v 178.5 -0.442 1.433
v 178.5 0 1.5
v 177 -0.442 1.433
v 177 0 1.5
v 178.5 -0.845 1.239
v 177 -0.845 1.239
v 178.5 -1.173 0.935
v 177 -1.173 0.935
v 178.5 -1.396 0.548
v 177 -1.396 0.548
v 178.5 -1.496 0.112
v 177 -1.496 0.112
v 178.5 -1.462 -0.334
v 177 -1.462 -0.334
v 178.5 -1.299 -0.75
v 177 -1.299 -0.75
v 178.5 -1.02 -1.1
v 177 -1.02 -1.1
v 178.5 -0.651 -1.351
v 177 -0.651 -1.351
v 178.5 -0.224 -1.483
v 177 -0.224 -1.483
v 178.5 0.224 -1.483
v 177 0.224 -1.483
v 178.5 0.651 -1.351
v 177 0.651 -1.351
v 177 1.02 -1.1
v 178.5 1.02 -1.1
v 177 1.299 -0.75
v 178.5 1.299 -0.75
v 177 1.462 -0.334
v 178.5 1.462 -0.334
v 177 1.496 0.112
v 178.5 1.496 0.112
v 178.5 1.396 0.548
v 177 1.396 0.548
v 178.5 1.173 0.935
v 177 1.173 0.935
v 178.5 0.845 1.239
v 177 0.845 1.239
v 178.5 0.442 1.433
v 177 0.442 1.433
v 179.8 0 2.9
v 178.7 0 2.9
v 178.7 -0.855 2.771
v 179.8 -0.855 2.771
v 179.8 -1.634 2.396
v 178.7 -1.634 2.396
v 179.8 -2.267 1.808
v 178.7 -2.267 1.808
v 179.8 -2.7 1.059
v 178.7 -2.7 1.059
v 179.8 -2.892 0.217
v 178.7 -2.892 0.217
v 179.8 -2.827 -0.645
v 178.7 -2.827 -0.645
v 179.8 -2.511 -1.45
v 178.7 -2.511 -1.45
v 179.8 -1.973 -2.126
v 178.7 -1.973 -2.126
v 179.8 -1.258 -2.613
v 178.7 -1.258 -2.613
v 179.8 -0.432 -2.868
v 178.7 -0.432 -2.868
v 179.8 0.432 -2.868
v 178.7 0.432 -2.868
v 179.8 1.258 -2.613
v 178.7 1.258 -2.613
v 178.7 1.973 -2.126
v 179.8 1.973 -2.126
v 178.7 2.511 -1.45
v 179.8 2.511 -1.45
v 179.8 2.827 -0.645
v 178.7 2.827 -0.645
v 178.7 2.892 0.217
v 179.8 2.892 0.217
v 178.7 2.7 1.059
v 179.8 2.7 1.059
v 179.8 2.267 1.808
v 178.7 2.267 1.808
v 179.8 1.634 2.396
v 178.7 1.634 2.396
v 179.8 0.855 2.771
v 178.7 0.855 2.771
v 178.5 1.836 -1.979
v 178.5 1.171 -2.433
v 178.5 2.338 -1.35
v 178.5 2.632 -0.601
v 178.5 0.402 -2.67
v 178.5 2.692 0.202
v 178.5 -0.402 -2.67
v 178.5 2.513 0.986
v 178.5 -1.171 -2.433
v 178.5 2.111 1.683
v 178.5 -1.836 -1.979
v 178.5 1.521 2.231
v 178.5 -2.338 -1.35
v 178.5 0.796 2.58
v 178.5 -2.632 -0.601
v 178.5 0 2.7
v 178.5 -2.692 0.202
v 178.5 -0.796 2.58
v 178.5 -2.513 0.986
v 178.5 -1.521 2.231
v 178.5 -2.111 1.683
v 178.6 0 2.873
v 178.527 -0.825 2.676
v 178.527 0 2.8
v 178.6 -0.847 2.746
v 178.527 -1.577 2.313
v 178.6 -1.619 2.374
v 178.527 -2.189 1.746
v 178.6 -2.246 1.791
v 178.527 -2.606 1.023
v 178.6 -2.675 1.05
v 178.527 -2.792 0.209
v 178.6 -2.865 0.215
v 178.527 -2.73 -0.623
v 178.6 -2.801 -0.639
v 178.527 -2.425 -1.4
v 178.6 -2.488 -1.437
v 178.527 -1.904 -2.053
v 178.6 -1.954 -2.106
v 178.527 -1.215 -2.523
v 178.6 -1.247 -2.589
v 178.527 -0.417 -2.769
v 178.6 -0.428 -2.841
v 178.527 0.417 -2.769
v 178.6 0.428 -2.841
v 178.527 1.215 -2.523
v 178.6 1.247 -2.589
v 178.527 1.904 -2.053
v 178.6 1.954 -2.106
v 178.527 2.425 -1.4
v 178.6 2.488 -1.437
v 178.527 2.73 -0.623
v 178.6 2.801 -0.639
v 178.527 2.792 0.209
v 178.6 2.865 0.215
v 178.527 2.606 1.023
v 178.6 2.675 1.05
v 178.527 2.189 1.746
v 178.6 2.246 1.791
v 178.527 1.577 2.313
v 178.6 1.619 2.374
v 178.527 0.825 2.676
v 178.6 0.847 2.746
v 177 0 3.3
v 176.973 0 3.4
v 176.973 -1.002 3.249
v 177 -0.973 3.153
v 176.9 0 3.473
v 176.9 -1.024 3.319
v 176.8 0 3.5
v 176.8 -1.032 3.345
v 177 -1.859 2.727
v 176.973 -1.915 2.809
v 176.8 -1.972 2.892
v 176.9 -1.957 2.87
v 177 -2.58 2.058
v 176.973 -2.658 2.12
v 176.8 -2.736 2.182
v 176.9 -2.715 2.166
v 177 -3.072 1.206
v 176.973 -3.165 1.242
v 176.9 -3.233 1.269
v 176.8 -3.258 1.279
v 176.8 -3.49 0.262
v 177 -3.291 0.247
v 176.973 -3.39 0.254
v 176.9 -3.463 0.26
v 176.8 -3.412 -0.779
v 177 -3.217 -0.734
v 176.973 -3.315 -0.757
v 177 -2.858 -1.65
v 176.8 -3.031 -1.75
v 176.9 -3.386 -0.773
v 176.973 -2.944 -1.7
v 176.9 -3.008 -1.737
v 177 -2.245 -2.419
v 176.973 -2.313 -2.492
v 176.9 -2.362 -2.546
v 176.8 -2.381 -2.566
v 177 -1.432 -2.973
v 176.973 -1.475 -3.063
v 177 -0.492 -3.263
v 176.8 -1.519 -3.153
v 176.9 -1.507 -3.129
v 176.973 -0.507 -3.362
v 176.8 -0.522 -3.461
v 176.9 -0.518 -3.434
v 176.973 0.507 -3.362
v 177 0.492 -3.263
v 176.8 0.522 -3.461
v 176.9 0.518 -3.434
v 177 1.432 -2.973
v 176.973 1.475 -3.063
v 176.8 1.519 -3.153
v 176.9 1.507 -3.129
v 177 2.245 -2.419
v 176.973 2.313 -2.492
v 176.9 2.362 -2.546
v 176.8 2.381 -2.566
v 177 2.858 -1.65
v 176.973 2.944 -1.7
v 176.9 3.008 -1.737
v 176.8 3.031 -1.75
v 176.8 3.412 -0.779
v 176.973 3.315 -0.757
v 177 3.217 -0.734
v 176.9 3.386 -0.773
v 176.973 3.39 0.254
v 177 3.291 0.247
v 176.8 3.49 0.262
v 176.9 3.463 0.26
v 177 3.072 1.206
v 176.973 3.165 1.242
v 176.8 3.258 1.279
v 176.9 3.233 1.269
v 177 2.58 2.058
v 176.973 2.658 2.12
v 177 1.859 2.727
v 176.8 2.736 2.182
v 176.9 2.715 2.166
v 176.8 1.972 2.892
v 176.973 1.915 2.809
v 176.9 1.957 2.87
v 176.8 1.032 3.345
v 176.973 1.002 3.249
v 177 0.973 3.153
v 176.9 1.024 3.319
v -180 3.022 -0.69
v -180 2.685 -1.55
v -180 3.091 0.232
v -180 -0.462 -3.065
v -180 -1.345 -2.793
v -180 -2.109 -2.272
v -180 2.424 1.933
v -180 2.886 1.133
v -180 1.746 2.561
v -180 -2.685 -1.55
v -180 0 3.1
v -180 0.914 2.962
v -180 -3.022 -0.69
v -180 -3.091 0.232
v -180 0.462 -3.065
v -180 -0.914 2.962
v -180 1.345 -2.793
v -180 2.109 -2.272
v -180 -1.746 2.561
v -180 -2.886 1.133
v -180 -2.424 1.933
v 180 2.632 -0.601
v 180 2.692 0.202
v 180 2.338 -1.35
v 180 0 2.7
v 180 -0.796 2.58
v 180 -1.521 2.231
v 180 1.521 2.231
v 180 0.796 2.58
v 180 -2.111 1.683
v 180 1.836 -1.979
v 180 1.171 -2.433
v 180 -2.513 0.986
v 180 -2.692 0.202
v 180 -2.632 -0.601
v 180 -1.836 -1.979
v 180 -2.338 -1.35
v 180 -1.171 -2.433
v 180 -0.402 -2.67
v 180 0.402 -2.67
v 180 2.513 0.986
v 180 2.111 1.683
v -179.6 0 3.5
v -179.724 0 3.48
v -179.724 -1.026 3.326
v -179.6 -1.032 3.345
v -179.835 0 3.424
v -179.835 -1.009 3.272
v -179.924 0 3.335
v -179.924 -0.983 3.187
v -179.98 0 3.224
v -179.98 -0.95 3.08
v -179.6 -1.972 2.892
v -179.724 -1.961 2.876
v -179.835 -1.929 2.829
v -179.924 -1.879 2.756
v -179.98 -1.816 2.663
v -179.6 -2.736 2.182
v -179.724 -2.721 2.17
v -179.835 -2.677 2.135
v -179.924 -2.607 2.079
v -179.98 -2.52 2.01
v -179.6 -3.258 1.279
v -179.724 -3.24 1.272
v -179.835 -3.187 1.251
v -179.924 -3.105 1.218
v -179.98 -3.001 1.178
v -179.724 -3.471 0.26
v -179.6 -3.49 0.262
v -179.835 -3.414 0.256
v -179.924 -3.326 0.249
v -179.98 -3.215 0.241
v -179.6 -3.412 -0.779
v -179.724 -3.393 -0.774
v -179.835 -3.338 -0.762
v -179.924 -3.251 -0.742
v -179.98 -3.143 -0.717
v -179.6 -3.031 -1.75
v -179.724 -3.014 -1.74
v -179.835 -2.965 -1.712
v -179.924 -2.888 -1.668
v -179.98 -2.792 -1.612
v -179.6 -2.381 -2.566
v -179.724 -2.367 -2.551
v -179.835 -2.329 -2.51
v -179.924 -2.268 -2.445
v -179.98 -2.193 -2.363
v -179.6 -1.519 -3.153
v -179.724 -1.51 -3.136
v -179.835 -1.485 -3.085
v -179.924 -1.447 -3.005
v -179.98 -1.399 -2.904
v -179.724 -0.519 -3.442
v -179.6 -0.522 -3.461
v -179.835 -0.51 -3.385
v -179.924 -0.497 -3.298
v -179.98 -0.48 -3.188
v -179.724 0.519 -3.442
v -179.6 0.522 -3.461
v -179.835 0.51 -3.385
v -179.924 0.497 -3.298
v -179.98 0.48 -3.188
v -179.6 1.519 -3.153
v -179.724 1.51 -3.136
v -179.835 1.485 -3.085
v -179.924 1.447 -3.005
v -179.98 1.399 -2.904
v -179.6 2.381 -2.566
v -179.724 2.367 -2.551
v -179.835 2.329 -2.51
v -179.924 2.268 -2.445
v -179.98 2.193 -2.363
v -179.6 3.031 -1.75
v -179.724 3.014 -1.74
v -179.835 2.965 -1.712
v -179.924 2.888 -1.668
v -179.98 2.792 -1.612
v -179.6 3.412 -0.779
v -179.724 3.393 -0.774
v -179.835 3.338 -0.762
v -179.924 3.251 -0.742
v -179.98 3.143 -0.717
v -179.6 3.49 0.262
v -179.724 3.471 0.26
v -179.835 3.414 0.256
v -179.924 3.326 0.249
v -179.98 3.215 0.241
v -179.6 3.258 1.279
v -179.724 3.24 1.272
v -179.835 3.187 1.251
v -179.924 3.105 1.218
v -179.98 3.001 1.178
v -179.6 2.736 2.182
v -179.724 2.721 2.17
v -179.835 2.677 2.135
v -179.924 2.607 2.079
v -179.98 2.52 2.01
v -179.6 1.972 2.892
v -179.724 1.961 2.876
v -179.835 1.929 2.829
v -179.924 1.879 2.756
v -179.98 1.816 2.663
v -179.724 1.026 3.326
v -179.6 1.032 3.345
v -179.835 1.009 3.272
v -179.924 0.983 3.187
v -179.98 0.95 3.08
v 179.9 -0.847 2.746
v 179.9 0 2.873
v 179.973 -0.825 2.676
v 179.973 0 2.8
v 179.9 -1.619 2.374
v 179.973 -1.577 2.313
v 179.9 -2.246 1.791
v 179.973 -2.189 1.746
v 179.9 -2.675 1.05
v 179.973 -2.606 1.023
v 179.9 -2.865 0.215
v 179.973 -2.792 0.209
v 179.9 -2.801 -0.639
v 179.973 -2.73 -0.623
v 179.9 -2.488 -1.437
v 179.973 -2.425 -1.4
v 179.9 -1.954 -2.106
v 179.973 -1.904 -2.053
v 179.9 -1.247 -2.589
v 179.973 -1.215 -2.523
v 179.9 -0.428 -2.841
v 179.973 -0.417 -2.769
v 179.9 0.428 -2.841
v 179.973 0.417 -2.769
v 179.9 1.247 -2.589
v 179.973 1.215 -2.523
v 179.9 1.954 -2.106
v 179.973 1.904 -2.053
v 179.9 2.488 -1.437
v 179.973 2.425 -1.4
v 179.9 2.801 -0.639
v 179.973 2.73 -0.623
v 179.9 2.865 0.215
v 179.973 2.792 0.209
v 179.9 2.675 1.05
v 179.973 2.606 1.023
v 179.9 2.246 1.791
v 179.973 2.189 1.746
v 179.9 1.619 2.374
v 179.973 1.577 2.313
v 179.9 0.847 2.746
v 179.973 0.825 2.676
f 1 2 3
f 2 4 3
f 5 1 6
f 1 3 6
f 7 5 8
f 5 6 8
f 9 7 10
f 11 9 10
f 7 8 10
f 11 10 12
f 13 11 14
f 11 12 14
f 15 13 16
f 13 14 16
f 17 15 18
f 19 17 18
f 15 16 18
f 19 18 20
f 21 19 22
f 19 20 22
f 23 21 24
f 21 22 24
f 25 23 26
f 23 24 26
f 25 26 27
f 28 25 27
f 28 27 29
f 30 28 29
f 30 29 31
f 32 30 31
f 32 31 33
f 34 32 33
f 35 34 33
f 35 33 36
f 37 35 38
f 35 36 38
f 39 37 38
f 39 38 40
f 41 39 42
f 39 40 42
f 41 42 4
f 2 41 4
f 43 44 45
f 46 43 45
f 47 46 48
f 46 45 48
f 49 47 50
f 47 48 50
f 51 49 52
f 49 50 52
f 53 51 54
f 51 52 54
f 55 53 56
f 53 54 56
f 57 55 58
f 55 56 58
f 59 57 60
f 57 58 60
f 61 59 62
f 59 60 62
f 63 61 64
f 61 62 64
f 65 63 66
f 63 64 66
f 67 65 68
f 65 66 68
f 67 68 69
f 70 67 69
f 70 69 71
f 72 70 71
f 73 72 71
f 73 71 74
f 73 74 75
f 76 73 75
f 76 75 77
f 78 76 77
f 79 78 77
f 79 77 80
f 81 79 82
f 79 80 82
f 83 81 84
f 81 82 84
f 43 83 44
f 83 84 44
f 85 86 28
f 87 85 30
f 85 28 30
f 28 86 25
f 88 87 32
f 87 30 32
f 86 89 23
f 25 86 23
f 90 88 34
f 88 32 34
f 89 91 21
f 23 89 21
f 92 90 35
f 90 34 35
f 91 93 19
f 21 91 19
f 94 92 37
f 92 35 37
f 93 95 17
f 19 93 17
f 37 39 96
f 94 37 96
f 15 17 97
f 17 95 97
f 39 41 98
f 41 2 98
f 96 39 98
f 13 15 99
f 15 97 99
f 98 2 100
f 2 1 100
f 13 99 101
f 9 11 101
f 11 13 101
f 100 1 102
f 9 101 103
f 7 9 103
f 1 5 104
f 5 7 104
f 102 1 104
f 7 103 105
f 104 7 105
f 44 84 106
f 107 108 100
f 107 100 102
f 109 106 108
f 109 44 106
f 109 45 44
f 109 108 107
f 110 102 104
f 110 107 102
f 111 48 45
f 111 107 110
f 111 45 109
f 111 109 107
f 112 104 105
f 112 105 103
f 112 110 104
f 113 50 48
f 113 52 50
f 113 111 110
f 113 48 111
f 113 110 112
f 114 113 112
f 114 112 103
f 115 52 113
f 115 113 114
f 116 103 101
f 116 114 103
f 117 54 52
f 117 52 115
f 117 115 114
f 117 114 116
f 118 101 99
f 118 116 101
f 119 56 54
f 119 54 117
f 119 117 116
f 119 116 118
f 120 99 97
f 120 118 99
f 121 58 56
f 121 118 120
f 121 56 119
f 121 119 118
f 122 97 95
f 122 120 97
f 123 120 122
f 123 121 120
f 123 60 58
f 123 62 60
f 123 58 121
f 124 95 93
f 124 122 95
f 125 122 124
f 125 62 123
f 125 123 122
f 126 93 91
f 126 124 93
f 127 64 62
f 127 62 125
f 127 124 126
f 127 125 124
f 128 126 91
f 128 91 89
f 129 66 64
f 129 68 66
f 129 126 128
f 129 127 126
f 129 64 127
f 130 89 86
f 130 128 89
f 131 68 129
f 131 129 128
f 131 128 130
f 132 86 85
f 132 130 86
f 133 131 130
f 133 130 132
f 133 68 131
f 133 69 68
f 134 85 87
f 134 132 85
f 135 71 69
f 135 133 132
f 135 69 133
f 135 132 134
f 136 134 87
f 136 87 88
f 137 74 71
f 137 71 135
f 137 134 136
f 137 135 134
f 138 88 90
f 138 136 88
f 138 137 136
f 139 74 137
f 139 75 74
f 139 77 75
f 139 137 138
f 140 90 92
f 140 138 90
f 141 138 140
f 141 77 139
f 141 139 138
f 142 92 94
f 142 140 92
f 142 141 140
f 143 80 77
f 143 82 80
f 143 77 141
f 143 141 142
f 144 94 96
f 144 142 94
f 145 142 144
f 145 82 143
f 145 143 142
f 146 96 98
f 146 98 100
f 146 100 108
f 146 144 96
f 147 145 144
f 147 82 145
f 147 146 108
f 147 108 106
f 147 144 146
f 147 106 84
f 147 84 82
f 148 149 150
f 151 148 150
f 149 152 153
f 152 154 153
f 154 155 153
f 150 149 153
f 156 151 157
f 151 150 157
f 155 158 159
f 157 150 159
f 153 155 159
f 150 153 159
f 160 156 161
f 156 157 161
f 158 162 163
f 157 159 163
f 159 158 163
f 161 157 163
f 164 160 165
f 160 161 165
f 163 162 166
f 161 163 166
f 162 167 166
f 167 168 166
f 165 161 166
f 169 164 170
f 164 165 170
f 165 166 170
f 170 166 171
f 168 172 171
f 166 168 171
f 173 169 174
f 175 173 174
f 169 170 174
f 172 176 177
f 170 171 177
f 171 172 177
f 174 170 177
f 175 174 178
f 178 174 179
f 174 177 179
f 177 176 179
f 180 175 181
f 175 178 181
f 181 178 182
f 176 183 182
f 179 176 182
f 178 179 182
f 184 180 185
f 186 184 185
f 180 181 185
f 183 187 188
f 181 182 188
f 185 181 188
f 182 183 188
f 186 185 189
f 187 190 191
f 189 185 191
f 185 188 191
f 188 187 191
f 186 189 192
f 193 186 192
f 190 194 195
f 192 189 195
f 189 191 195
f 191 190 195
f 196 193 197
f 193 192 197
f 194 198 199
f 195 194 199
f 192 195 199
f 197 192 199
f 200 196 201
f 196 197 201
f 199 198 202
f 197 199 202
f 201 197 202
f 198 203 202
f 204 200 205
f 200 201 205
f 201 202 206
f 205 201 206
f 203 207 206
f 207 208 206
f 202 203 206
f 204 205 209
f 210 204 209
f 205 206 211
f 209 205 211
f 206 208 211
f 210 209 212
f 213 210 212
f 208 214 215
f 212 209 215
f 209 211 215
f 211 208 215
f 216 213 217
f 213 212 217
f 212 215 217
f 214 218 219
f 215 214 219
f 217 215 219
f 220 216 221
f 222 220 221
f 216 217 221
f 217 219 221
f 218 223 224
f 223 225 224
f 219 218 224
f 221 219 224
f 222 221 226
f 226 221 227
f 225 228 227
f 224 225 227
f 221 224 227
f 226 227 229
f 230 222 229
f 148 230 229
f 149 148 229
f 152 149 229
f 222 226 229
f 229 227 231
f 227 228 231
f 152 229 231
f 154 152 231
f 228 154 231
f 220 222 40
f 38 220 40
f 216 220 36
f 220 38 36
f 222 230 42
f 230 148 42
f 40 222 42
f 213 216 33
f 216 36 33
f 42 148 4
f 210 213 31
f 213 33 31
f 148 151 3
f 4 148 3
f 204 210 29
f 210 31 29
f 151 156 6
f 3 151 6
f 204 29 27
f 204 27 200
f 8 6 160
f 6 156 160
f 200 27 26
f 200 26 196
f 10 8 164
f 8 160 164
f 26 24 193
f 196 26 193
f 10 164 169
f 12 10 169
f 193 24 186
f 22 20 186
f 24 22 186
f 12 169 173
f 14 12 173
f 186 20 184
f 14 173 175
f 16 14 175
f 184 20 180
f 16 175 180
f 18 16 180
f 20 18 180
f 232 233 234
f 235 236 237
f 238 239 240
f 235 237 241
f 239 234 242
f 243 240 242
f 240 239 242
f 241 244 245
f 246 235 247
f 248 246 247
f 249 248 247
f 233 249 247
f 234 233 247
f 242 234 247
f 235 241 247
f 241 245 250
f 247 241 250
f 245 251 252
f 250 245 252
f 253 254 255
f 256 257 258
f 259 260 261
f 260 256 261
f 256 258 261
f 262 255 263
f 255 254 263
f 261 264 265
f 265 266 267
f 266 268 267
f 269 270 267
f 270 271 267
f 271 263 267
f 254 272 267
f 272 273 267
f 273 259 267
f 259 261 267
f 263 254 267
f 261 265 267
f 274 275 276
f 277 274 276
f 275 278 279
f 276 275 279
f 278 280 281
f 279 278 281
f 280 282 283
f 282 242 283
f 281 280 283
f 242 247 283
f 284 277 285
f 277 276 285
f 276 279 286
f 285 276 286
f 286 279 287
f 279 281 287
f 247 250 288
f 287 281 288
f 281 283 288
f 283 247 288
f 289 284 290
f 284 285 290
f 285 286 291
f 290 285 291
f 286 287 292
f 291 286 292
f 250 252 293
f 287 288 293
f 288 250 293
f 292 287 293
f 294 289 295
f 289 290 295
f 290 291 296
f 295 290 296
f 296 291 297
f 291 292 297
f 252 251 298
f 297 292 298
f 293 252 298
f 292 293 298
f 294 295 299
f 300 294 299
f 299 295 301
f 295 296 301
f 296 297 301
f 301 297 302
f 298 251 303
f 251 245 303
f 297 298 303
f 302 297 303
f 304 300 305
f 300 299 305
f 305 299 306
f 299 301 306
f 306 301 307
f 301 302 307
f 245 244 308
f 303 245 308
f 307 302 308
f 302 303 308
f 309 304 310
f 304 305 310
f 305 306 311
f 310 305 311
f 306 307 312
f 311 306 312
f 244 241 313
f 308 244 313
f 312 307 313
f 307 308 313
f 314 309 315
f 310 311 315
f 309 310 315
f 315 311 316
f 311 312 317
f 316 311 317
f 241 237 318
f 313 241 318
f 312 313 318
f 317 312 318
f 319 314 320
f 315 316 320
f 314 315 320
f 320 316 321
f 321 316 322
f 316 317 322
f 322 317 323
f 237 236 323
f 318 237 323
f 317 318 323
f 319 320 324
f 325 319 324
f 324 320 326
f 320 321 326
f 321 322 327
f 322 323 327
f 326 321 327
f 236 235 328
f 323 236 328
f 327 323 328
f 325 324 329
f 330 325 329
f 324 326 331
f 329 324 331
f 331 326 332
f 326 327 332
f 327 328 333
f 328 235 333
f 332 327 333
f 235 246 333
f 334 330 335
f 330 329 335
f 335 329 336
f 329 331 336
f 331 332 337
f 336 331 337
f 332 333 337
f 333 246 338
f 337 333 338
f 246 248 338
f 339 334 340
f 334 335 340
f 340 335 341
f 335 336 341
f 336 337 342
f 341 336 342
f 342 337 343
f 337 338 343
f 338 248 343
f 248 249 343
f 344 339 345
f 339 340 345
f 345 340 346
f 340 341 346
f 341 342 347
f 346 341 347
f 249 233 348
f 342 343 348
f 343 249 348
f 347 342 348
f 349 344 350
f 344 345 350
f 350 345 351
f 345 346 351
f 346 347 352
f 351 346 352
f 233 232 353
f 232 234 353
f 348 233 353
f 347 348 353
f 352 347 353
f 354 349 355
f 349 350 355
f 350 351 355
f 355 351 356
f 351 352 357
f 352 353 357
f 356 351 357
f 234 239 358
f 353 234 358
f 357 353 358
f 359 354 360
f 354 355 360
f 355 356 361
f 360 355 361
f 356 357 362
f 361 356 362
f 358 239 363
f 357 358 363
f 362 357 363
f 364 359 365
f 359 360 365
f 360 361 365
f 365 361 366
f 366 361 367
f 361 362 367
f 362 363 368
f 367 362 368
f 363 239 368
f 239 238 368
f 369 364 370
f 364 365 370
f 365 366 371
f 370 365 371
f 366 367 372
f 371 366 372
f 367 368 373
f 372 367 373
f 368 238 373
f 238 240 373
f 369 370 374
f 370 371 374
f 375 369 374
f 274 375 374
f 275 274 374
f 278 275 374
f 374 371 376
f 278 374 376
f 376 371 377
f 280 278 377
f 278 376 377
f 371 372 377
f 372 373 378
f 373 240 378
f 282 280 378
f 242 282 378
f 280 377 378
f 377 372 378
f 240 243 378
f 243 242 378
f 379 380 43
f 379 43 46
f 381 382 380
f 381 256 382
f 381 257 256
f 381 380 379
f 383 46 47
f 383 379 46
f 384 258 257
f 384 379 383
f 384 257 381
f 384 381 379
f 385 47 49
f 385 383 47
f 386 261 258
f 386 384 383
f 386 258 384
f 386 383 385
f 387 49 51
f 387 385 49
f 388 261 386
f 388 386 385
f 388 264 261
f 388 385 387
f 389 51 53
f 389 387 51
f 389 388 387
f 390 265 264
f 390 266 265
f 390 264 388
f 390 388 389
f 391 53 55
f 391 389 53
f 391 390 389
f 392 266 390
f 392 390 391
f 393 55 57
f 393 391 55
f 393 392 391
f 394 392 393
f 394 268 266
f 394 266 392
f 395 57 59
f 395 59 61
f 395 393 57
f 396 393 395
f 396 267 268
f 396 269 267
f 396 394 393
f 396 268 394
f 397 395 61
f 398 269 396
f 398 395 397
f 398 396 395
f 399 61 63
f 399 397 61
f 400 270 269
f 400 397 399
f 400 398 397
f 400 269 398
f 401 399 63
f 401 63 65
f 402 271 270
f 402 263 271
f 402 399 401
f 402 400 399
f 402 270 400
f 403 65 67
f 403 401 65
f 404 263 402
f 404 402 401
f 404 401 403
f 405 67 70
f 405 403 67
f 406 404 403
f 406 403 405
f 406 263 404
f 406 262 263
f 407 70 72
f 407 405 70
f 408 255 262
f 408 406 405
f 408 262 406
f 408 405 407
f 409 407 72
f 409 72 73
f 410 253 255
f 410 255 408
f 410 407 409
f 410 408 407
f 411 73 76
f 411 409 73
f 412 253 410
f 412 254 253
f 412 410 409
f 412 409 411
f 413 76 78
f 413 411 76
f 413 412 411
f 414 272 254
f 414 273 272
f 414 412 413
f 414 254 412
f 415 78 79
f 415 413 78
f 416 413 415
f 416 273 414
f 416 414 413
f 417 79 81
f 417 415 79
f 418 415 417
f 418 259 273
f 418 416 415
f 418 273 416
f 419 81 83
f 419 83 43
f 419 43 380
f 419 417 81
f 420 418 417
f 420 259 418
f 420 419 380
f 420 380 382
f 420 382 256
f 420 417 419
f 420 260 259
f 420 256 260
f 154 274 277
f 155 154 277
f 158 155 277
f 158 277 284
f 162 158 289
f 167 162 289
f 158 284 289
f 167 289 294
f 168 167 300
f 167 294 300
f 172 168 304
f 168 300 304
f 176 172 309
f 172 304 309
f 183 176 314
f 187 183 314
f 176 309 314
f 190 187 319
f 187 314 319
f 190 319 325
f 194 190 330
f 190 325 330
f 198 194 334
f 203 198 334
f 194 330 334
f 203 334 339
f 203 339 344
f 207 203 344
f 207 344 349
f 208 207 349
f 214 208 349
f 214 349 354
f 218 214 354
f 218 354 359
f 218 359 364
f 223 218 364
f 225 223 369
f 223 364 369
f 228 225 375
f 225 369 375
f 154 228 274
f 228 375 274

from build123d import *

# Parameters (mm, degrees)
FILLET1_R = 0.2
FILLET2_R = 0.2
FILLET3_R = 0.4


with BuildPart() as part:
    # Sketch1 → Revolve1 (revolve)
    with BuildSketch(Plane.XY, mode=Mode.PRIVATE) as revolve1_sk:
        Polygon((-180, 0), (180, 0), (180, 2.9), (178.5, 2.9), (178.5, 1.5), (177, 1.5), (177, 3.5), (-180, 3.5), align=None)
    revolve(revolve1_sk.sketch.rotate(Axis((-180, 0, 0), (1, 0, 0)), 90), axis=Axis((-180, 0, 0), (1, 0, 0)))

    # Fillet1
    fillet1_edges = [part.edges().sort_by_distance(p)[0] for p in [
        (177, 0, -3.5),
    ]]
    fillet(fillet1_edges, radius=FILLET1_R)

    # Fillet2
    fillet2_edges = [part.edges().sort_by_distance(p)[0] for p in [
        (180, 0, -2.9),
        (178.5, 0, -2.9),
    ]]
    fillet(fillet2_edges, radius=FILLET2_R)

    # Fillet3
    fillet3_edges = [part.edges().sort_by_distance(p)[0] for p in [
        (-180, 0, -3.5),
    ]]
    fillet(fillet3_edges, radius=FILLET3_R)


solid = part.part
